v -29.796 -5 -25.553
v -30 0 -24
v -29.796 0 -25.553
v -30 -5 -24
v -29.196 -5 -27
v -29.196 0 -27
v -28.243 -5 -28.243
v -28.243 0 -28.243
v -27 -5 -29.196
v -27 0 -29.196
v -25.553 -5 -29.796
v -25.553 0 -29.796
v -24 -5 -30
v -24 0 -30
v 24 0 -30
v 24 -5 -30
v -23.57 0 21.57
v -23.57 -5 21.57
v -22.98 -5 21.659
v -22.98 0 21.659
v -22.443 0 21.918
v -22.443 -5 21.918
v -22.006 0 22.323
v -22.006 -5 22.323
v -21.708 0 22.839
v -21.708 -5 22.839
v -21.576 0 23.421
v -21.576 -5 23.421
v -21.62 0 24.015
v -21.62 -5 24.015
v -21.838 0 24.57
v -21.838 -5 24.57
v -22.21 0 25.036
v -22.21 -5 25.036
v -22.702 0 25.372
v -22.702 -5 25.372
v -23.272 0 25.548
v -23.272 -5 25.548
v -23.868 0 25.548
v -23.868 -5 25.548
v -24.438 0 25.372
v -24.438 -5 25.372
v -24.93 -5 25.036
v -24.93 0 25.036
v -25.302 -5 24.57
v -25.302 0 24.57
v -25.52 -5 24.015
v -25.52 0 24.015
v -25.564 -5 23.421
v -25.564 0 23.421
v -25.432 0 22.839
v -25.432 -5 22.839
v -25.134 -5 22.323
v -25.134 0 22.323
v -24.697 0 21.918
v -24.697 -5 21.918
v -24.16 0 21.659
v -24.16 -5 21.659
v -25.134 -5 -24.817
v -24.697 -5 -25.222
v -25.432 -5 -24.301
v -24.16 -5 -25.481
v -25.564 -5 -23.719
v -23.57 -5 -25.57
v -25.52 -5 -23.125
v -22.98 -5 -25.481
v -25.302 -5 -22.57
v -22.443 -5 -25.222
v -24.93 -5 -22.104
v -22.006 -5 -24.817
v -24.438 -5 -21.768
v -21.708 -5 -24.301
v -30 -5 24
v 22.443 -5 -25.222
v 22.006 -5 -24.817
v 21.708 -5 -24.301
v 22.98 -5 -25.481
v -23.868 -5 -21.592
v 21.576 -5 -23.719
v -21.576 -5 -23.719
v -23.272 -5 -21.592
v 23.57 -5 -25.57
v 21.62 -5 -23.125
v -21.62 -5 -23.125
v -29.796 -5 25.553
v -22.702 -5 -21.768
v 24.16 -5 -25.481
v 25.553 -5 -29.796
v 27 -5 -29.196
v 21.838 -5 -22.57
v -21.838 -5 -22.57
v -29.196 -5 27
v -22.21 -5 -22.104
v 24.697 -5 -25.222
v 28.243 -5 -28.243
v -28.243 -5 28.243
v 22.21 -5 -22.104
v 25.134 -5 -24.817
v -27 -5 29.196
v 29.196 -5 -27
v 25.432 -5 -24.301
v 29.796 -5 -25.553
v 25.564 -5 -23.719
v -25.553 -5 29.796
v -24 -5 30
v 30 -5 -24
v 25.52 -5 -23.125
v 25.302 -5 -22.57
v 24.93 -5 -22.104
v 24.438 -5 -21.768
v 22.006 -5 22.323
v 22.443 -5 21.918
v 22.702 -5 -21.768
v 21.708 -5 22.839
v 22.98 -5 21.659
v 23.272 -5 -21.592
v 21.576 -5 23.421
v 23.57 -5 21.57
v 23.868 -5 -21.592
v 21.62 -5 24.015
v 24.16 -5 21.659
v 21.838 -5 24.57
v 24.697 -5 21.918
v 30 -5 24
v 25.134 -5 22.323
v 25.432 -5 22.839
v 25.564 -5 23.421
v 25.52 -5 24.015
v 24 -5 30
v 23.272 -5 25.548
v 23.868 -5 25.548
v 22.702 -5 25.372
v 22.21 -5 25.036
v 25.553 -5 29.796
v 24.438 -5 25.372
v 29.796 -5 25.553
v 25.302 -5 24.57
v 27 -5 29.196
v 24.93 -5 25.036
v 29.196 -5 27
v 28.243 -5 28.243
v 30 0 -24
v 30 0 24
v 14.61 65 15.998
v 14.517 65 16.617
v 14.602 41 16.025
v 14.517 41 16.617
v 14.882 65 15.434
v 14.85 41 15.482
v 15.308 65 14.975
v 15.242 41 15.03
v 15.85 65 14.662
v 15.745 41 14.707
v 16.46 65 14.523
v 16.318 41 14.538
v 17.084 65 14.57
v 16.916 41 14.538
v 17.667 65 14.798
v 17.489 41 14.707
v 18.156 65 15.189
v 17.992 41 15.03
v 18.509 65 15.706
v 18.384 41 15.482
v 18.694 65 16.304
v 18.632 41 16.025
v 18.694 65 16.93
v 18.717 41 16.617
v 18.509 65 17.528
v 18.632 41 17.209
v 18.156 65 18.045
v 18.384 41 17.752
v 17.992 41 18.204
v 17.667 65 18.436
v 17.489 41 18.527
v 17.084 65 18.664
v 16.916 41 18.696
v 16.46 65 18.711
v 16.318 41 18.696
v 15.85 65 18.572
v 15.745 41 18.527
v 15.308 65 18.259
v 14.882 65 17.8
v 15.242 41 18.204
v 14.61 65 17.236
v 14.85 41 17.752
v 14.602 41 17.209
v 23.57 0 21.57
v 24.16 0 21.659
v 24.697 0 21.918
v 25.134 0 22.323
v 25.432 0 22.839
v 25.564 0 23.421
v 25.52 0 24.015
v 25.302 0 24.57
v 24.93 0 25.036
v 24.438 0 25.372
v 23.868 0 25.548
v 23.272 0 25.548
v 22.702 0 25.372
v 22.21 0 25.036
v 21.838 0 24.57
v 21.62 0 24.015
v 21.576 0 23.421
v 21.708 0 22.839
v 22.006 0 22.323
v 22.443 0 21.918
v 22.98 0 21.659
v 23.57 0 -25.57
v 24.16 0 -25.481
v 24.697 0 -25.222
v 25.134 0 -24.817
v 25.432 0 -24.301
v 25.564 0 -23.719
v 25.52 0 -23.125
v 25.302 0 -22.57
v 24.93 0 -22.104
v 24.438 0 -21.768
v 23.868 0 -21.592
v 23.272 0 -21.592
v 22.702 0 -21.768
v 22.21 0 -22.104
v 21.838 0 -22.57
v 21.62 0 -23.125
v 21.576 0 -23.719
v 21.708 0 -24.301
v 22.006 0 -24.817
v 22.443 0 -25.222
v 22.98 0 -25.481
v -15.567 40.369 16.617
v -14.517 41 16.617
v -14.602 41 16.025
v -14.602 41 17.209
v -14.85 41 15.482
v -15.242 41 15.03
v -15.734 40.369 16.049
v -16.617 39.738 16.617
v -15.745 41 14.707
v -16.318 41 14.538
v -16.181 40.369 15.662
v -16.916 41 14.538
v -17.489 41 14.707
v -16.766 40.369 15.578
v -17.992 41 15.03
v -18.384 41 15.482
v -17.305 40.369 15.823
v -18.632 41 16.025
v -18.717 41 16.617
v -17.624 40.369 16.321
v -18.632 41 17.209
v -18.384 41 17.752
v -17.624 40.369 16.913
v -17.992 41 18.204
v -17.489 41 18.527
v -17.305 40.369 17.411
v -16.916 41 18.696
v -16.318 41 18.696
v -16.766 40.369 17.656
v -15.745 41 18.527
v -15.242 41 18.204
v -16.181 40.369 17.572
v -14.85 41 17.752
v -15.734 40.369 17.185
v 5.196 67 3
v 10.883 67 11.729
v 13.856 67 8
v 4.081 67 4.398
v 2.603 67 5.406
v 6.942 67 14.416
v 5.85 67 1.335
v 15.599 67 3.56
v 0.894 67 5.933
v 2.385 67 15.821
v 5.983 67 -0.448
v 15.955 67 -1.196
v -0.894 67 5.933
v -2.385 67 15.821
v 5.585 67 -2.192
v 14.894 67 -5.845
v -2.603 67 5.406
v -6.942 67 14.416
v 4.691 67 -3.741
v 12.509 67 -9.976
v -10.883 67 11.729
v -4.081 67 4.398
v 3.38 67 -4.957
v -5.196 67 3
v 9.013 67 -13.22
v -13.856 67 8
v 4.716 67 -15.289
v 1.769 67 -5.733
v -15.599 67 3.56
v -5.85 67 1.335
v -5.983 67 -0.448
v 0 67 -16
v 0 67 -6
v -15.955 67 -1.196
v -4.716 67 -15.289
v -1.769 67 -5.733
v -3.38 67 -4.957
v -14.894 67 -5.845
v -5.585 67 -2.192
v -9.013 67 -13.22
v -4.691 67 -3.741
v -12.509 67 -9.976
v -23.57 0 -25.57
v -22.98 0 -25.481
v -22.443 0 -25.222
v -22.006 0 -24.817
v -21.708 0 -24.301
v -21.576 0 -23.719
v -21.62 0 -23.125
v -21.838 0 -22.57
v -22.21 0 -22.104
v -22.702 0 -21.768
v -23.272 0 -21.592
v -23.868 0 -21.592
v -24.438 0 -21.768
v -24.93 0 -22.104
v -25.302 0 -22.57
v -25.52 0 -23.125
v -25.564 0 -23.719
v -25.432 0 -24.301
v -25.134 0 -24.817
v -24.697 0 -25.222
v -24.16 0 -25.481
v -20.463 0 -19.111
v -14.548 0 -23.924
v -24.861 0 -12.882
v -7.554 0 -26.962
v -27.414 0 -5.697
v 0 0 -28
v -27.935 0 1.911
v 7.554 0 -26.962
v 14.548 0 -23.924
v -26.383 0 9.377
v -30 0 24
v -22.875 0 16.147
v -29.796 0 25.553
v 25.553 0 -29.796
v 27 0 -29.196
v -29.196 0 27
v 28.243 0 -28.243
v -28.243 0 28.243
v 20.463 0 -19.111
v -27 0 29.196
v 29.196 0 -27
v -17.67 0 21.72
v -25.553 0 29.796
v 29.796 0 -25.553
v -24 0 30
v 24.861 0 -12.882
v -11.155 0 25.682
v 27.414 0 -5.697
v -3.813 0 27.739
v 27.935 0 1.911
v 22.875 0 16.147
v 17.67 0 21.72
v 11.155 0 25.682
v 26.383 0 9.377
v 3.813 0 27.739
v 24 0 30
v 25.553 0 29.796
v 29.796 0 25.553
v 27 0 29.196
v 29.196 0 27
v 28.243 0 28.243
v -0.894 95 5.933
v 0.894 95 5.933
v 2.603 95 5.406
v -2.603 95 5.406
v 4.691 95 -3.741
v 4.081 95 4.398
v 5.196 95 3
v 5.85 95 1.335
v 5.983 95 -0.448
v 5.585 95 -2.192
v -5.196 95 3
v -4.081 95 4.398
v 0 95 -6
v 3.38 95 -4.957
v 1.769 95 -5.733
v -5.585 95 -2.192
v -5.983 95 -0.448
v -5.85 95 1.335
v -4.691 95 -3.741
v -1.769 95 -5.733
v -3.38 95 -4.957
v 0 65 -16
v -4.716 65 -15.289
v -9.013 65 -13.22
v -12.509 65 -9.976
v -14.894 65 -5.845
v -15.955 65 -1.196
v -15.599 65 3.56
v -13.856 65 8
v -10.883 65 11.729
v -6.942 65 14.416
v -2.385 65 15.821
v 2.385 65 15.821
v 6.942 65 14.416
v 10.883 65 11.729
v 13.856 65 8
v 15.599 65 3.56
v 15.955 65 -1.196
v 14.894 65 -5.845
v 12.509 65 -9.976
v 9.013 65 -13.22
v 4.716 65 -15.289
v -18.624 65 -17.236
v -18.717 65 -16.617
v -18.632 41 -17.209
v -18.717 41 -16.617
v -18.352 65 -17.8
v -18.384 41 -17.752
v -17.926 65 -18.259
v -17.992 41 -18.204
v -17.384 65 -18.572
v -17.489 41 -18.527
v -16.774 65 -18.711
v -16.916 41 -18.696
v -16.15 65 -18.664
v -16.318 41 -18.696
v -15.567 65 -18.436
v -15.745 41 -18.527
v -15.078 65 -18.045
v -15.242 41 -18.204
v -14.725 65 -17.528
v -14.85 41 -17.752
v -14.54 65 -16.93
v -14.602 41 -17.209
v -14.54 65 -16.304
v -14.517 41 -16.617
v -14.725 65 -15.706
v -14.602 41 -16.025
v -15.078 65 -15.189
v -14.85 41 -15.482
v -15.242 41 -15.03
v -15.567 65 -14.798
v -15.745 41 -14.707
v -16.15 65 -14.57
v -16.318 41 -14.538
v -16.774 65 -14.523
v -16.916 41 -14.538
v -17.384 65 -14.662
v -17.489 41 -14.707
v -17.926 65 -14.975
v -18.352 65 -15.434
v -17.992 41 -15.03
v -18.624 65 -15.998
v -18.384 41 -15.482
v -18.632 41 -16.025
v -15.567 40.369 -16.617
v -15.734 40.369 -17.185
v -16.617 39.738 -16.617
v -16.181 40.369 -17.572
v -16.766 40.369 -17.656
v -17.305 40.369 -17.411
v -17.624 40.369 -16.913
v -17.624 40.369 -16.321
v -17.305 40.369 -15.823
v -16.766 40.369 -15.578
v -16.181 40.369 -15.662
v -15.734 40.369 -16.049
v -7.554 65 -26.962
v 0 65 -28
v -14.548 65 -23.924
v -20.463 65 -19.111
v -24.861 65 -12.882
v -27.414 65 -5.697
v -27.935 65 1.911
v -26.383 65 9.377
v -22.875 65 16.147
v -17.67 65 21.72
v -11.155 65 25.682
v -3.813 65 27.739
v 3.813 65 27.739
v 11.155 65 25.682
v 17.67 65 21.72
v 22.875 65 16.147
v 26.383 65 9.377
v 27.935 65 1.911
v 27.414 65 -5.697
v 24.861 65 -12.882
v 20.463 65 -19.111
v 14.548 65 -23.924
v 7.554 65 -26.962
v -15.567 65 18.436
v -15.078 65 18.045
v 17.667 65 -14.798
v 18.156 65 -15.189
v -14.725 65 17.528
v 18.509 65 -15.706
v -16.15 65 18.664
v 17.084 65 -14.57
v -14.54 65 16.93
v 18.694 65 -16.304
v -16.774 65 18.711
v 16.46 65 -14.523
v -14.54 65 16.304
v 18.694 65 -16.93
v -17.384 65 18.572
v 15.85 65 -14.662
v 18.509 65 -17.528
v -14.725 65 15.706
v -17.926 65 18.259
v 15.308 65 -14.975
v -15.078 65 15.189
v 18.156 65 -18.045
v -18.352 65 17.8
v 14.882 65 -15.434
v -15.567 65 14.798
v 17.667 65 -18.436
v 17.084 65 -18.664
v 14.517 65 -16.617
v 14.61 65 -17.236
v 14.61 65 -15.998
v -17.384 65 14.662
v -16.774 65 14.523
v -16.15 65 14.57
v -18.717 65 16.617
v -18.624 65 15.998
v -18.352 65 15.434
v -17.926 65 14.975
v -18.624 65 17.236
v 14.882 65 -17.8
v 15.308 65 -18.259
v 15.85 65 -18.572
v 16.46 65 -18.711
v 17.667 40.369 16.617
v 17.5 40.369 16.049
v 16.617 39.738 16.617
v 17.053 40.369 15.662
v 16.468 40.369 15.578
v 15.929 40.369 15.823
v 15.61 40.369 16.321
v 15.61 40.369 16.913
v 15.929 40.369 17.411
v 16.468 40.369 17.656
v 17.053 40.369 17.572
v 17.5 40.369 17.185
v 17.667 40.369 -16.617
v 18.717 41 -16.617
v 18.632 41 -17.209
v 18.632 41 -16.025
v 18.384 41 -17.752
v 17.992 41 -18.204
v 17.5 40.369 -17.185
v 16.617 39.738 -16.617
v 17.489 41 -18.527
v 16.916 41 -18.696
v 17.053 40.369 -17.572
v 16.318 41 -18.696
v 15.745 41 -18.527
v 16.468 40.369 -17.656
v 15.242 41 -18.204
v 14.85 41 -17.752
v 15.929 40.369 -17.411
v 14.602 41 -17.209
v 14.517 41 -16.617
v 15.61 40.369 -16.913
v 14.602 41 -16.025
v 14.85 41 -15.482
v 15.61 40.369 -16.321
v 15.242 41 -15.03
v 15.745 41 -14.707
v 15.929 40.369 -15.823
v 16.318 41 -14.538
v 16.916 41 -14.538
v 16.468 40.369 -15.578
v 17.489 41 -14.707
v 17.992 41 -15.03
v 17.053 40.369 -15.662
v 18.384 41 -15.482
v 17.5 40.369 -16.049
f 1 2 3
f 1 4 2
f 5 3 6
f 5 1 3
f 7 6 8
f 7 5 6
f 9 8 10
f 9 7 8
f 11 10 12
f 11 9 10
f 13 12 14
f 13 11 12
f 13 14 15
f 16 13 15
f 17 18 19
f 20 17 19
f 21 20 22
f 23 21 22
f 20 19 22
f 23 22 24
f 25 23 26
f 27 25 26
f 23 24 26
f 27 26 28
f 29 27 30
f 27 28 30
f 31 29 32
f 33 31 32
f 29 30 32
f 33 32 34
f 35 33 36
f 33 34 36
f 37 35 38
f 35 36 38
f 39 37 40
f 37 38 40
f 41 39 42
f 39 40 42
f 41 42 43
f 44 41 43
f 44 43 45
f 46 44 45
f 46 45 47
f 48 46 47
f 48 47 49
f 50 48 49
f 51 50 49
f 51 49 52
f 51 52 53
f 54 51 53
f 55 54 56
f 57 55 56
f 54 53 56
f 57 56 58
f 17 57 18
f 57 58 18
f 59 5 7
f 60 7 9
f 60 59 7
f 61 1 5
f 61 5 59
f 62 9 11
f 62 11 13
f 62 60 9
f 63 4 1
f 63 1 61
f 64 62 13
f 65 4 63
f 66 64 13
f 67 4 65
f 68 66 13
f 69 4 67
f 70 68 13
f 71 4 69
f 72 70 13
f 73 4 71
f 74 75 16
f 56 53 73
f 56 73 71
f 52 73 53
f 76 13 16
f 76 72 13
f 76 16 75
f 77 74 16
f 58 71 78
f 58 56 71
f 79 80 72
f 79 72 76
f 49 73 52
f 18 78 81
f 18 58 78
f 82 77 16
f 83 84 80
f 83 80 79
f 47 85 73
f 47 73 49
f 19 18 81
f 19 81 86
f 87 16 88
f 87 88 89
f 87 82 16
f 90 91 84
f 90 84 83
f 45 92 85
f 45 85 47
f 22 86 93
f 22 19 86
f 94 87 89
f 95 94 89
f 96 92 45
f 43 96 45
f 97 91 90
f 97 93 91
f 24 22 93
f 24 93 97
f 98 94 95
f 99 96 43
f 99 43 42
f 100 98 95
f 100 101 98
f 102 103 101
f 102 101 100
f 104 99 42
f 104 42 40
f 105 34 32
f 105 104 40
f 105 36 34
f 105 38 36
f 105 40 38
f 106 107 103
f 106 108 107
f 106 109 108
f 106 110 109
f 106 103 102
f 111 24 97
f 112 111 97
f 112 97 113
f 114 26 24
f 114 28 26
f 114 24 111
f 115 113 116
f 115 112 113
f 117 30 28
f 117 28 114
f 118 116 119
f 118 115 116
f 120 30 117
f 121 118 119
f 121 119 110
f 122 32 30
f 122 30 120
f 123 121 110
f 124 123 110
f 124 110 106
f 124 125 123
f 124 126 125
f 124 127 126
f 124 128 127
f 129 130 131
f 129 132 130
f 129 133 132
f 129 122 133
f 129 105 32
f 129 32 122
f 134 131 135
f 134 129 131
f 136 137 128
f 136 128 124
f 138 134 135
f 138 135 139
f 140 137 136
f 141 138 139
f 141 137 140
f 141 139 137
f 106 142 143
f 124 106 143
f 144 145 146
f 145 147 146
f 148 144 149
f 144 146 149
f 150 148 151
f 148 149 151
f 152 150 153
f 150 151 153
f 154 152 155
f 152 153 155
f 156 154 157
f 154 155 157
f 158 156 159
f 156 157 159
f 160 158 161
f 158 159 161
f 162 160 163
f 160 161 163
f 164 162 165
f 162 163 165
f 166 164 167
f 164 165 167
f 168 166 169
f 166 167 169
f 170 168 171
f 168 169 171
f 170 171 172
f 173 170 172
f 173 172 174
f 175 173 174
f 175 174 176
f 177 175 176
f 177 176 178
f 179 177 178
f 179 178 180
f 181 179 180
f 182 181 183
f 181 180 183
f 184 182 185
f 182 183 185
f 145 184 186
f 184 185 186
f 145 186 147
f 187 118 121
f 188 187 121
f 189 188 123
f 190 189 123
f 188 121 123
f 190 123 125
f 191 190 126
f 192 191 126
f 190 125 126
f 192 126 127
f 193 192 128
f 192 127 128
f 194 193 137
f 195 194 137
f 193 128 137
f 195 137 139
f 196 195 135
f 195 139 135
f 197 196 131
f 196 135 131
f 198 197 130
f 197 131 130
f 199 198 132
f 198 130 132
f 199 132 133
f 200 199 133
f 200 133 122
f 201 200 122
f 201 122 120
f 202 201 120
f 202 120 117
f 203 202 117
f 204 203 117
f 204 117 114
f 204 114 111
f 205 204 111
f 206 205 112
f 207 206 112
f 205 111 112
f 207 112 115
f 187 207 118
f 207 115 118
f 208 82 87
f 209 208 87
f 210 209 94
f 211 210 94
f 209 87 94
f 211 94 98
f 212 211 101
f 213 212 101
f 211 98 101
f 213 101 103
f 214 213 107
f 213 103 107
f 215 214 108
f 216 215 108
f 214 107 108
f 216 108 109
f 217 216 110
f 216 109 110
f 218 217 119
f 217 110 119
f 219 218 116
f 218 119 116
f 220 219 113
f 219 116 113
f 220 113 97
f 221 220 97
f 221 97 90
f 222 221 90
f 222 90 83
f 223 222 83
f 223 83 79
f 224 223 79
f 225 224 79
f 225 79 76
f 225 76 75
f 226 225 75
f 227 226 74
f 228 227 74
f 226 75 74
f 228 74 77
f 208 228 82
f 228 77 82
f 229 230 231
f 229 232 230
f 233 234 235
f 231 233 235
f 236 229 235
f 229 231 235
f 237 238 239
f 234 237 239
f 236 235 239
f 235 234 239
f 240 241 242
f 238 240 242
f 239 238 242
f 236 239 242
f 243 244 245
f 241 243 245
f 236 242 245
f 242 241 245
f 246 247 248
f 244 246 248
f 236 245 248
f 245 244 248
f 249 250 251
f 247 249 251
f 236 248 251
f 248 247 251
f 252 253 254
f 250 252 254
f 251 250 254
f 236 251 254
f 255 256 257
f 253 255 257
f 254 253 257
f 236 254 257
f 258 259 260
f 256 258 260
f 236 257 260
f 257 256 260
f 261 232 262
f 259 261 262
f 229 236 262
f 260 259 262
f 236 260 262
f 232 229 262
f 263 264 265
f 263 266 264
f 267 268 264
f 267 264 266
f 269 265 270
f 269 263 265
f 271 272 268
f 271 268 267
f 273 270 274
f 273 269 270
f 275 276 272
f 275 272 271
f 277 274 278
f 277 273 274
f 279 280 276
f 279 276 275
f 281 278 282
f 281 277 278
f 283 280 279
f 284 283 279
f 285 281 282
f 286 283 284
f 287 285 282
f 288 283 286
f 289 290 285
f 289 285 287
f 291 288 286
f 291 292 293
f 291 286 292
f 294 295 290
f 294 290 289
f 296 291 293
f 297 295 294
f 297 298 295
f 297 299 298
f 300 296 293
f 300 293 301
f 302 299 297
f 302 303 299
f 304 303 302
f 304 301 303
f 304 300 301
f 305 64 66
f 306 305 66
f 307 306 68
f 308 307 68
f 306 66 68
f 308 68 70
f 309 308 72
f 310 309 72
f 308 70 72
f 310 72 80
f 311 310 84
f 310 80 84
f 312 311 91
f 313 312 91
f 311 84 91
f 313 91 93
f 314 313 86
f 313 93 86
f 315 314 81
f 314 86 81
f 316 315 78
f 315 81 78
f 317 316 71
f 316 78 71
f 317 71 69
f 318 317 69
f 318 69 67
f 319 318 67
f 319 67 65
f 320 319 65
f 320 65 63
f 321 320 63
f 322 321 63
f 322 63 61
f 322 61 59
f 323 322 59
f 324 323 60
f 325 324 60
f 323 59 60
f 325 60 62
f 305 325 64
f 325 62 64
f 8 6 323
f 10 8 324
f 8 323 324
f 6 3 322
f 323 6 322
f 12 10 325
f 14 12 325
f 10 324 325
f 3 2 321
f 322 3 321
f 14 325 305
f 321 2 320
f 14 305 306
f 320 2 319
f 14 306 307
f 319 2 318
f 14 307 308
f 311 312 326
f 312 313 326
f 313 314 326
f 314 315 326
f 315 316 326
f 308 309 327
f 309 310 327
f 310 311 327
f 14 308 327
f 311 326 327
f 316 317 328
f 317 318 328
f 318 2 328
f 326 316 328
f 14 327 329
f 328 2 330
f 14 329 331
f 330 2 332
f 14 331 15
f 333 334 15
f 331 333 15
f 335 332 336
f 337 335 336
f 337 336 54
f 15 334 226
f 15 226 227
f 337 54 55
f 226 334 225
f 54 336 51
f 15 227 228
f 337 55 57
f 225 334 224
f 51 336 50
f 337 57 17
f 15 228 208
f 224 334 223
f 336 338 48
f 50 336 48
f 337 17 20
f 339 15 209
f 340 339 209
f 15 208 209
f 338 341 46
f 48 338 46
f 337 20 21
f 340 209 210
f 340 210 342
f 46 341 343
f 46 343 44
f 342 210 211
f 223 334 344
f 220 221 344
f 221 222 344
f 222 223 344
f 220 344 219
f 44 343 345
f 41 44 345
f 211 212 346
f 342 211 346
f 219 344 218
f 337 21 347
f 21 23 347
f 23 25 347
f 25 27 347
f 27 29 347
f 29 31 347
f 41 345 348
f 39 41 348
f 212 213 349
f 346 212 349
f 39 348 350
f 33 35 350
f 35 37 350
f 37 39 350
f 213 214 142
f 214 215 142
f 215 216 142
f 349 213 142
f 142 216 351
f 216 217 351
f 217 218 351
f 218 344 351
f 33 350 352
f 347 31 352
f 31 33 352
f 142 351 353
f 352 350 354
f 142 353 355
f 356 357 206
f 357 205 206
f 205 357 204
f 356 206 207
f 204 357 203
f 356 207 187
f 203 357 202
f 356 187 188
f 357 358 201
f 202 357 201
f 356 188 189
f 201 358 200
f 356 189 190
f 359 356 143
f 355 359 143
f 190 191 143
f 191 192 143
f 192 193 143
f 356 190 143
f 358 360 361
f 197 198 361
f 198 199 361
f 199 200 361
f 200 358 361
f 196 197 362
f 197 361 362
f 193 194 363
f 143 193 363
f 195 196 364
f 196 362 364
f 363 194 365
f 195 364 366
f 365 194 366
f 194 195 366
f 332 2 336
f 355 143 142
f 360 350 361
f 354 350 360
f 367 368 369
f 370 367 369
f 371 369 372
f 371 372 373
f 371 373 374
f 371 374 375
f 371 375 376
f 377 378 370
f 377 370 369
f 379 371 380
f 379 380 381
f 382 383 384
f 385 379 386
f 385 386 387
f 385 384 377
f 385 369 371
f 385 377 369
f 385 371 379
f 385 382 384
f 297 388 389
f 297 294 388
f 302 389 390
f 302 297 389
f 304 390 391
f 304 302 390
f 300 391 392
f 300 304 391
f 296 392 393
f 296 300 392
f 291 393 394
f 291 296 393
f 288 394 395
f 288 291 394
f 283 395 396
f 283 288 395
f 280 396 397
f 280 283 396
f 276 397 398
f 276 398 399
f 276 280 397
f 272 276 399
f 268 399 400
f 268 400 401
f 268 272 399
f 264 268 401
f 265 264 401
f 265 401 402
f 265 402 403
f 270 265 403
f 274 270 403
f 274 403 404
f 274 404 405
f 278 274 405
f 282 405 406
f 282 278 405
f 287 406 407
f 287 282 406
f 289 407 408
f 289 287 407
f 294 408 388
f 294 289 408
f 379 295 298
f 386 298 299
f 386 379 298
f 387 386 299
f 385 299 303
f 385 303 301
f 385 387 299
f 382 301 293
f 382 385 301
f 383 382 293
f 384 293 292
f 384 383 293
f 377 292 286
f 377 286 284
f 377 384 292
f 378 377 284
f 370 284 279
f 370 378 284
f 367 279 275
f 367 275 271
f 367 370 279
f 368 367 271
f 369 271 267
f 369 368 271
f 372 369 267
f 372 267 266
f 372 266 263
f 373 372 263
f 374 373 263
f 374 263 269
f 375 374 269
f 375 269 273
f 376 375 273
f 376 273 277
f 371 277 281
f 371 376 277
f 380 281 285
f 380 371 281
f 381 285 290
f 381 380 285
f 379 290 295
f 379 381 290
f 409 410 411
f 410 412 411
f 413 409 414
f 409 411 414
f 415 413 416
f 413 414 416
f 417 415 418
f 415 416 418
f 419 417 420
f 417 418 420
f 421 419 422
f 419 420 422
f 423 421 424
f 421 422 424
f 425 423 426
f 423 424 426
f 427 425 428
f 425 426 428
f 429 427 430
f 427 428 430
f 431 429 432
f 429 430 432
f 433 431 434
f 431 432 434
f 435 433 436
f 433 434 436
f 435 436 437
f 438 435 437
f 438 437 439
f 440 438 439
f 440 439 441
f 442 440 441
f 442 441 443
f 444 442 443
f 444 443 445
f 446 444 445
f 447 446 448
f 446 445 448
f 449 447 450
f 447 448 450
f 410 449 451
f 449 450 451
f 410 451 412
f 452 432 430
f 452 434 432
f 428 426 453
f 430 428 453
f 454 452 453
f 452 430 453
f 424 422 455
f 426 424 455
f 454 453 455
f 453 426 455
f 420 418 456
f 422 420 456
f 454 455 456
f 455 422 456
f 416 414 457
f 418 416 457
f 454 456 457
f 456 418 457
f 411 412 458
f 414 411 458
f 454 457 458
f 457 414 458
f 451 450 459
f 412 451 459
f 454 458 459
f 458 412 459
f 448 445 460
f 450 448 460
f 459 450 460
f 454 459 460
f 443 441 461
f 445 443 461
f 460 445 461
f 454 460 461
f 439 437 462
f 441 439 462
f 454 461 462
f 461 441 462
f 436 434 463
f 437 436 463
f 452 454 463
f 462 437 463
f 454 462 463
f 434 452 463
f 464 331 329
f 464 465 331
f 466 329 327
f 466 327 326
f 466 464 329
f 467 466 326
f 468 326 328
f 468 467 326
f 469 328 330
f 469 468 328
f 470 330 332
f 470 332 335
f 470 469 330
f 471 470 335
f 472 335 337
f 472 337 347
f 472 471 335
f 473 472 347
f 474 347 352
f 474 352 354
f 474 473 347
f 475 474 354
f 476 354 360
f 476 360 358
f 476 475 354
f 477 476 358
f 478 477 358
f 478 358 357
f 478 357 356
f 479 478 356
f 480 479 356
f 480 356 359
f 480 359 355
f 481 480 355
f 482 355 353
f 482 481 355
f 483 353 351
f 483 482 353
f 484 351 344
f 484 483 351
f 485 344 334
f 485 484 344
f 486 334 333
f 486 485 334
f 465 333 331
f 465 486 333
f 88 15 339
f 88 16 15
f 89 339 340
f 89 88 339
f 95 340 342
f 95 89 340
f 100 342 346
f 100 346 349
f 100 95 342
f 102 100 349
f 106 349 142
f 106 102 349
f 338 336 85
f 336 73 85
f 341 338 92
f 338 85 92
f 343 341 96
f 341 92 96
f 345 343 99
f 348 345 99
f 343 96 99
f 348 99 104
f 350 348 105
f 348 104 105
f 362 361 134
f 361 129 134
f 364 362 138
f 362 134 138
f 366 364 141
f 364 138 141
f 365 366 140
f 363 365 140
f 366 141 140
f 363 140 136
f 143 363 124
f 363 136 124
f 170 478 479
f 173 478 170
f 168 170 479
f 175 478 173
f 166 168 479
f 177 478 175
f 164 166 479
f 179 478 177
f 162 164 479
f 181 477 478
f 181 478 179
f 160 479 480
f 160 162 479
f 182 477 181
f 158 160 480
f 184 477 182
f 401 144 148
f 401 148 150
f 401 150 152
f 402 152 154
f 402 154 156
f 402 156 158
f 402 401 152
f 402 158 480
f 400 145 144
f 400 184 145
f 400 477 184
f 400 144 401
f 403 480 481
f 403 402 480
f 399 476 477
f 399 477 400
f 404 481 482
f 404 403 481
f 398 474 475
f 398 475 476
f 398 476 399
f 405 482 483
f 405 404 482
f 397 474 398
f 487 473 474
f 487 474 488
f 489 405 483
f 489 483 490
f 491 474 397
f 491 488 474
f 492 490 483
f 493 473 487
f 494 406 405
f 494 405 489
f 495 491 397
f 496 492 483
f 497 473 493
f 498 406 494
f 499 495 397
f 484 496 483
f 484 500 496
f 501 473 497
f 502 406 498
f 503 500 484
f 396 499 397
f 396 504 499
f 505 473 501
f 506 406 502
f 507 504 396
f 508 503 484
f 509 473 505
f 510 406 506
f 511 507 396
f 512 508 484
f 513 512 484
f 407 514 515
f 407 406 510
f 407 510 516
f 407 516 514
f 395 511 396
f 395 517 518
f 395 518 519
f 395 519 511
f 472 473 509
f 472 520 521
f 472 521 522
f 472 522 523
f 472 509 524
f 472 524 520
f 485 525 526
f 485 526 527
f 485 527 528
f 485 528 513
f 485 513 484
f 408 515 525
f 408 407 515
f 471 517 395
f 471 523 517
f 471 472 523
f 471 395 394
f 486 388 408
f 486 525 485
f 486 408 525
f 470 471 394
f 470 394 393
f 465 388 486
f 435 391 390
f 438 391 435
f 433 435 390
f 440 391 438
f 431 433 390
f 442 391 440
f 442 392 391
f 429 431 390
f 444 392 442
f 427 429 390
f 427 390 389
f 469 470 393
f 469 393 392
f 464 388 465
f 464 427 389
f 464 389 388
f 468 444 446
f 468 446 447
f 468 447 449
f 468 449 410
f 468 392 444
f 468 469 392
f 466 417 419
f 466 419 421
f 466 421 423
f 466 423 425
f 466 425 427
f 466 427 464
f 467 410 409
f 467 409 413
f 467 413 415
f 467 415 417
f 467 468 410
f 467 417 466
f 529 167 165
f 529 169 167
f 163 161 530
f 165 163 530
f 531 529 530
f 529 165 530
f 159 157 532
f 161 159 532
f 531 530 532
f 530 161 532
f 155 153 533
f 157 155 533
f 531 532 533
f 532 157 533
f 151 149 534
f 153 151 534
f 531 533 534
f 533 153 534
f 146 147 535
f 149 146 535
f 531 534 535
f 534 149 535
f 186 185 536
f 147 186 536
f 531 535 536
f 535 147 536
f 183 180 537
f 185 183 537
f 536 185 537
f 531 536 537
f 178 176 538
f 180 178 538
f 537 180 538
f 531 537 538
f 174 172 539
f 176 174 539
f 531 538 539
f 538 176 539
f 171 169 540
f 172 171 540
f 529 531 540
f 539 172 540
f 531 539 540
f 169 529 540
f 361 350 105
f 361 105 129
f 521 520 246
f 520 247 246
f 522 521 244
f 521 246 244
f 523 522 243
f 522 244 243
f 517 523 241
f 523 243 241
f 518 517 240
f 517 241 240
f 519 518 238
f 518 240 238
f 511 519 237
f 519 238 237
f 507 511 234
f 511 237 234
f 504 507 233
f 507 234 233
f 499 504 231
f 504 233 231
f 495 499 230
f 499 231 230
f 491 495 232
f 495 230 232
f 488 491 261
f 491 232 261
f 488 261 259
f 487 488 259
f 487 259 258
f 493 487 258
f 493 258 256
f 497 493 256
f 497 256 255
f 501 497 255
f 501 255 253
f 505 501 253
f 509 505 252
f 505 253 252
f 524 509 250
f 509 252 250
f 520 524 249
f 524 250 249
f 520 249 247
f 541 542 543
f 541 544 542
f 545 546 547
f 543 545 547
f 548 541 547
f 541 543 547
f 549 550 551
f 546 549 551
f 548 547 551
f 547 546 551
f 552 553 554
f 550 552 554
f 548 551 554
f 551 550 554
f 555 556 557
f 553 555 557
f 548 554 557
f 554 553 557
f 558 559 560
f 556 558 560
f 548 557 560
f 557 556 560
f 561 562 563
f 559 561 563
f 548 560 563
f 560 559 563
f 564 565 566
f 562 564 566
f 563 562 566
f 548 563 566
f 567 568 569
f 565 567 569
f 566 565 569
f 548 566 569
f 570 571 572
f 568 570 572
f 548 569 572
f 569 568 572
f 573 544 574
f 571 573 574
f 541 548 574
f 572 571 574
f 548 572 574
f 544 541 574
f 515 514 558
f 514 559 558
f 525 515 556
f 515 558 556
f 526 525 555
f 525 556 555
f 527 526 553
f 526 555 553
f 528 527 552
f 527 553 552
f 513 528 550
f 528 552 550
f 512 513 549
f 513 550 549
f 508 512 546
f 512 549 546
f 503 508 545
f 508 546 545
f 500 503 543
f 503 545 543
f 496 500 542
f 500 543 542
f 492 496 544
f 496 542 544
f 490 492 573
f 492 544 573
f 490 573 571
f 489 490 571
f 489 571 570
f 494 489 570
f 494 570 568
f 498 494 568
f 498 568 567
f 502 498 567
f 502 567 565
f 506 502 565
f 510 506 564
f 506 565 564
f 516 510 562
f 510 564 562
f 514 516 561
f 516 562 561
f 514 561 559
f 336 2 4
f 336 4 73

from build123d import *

# Parameters (mm, degrees)
ESQUISSE2_W             = 60
ESQUISSE2_H             = 60
BOSS_EXTRU_1_DEPTH      = 5
ESQUISSE3_R             = 2
ENL_V_MAT_EXTRU_1_DEPTH = 5
CONG_1_R                = 6
TROU_TARAUD_M51_D       = 4.2
TROU_TARAUD_M51_DEPTH   = 24
TROU_TARAUD_M51_TIP     = 1.2618073


with BuildPart() as part:
    # Esquisse1 → Révolution1 (revolve)
    with BuildSketch(Plane.XY, mode=Mode.PRIVATE) as r_volution1_sk:
        Polygon((0, 0), (28, 0), (28, 65), (16, 65), (16, 67), (6, 67), (6, 95), (0, 95), align=None)
    revolve(r_volution1_sk.sketch.rotate(Axis((0, 0, 0), (0, 1, 0)), 90), axis=Axis((0, 0, 0), (0, 1, 0)))

    # Esquisse2 → Boss.-Extru.1 (add)
    with BuildSketch(Plane.XZ):
        Rectangle(ESQUISSE2_W, ESQUISSE2_H)
    extrude(amount=BOSS_EXTRU_1_DEPTH)

    # Esquisse3 → Enlèv. mat.-Extru.1 (cut)
    with BuildSketch(Plane.XZ.offset(5)):
        with Locations(Location((-23.57, 23.57, 0), (0, 0, 270))):
            Circle(ESQUISSE3_R)
        with Locations(Location((23.57, 23.57, 0), (0, 0, 270))):
            Circle(ESQUISSE3_R)
        with Locations(Location((-23.57, -23.57, 0), (0, 0, 270))):
            Circle(ESQUISSE3_R)
        with Locations(Location((23.57, -23.57, 0), (0, 0, 270))):
            Circle(ESQUISSE3_R)
    extrude(amount=-ENL_V_MAT_EXTRU_1_DEPTH, mode=Mode.SUBTRACT)

    # Congé1
    cong_1_edges = [part.edges().sort_by_distance(p)[0] for p in [
        (-30, -2.5, 30),
        (-30, -2.5, -30),
        (30, -2.5, -30),
        (30, -2.5, 30),
    ]]
    fillet(cong_1_edges, radius=CONG_1_R)

    # Trou taraudé M51
    with Locations(Plane(origin=(0, 65, 0), x_dir=(1, 0, 0), z_dir=(0, 1, 0))):
        with Locations((-16.617009358, 16.617009358), (16.617009358, 16.617009358), (16.617009358, -16.617009358), (-16.617009358, -16.617009358)):
            Hole(TROU_TARAUD_M51_D / 2, depth=TROU_TARAUD_M51_DEPTH)
            with Locations((0, 0, -(TROU_TARAUD_M51_DEPTH + TROU_TARAUD_M51_TIP / 2))):  # 118° drill point
                Cone(0, TROU_TARAUD_M51_D / 2, TROU_TARAUD_M51_TIP, mode=Mode.SUBTRACT)


solid = part.part
